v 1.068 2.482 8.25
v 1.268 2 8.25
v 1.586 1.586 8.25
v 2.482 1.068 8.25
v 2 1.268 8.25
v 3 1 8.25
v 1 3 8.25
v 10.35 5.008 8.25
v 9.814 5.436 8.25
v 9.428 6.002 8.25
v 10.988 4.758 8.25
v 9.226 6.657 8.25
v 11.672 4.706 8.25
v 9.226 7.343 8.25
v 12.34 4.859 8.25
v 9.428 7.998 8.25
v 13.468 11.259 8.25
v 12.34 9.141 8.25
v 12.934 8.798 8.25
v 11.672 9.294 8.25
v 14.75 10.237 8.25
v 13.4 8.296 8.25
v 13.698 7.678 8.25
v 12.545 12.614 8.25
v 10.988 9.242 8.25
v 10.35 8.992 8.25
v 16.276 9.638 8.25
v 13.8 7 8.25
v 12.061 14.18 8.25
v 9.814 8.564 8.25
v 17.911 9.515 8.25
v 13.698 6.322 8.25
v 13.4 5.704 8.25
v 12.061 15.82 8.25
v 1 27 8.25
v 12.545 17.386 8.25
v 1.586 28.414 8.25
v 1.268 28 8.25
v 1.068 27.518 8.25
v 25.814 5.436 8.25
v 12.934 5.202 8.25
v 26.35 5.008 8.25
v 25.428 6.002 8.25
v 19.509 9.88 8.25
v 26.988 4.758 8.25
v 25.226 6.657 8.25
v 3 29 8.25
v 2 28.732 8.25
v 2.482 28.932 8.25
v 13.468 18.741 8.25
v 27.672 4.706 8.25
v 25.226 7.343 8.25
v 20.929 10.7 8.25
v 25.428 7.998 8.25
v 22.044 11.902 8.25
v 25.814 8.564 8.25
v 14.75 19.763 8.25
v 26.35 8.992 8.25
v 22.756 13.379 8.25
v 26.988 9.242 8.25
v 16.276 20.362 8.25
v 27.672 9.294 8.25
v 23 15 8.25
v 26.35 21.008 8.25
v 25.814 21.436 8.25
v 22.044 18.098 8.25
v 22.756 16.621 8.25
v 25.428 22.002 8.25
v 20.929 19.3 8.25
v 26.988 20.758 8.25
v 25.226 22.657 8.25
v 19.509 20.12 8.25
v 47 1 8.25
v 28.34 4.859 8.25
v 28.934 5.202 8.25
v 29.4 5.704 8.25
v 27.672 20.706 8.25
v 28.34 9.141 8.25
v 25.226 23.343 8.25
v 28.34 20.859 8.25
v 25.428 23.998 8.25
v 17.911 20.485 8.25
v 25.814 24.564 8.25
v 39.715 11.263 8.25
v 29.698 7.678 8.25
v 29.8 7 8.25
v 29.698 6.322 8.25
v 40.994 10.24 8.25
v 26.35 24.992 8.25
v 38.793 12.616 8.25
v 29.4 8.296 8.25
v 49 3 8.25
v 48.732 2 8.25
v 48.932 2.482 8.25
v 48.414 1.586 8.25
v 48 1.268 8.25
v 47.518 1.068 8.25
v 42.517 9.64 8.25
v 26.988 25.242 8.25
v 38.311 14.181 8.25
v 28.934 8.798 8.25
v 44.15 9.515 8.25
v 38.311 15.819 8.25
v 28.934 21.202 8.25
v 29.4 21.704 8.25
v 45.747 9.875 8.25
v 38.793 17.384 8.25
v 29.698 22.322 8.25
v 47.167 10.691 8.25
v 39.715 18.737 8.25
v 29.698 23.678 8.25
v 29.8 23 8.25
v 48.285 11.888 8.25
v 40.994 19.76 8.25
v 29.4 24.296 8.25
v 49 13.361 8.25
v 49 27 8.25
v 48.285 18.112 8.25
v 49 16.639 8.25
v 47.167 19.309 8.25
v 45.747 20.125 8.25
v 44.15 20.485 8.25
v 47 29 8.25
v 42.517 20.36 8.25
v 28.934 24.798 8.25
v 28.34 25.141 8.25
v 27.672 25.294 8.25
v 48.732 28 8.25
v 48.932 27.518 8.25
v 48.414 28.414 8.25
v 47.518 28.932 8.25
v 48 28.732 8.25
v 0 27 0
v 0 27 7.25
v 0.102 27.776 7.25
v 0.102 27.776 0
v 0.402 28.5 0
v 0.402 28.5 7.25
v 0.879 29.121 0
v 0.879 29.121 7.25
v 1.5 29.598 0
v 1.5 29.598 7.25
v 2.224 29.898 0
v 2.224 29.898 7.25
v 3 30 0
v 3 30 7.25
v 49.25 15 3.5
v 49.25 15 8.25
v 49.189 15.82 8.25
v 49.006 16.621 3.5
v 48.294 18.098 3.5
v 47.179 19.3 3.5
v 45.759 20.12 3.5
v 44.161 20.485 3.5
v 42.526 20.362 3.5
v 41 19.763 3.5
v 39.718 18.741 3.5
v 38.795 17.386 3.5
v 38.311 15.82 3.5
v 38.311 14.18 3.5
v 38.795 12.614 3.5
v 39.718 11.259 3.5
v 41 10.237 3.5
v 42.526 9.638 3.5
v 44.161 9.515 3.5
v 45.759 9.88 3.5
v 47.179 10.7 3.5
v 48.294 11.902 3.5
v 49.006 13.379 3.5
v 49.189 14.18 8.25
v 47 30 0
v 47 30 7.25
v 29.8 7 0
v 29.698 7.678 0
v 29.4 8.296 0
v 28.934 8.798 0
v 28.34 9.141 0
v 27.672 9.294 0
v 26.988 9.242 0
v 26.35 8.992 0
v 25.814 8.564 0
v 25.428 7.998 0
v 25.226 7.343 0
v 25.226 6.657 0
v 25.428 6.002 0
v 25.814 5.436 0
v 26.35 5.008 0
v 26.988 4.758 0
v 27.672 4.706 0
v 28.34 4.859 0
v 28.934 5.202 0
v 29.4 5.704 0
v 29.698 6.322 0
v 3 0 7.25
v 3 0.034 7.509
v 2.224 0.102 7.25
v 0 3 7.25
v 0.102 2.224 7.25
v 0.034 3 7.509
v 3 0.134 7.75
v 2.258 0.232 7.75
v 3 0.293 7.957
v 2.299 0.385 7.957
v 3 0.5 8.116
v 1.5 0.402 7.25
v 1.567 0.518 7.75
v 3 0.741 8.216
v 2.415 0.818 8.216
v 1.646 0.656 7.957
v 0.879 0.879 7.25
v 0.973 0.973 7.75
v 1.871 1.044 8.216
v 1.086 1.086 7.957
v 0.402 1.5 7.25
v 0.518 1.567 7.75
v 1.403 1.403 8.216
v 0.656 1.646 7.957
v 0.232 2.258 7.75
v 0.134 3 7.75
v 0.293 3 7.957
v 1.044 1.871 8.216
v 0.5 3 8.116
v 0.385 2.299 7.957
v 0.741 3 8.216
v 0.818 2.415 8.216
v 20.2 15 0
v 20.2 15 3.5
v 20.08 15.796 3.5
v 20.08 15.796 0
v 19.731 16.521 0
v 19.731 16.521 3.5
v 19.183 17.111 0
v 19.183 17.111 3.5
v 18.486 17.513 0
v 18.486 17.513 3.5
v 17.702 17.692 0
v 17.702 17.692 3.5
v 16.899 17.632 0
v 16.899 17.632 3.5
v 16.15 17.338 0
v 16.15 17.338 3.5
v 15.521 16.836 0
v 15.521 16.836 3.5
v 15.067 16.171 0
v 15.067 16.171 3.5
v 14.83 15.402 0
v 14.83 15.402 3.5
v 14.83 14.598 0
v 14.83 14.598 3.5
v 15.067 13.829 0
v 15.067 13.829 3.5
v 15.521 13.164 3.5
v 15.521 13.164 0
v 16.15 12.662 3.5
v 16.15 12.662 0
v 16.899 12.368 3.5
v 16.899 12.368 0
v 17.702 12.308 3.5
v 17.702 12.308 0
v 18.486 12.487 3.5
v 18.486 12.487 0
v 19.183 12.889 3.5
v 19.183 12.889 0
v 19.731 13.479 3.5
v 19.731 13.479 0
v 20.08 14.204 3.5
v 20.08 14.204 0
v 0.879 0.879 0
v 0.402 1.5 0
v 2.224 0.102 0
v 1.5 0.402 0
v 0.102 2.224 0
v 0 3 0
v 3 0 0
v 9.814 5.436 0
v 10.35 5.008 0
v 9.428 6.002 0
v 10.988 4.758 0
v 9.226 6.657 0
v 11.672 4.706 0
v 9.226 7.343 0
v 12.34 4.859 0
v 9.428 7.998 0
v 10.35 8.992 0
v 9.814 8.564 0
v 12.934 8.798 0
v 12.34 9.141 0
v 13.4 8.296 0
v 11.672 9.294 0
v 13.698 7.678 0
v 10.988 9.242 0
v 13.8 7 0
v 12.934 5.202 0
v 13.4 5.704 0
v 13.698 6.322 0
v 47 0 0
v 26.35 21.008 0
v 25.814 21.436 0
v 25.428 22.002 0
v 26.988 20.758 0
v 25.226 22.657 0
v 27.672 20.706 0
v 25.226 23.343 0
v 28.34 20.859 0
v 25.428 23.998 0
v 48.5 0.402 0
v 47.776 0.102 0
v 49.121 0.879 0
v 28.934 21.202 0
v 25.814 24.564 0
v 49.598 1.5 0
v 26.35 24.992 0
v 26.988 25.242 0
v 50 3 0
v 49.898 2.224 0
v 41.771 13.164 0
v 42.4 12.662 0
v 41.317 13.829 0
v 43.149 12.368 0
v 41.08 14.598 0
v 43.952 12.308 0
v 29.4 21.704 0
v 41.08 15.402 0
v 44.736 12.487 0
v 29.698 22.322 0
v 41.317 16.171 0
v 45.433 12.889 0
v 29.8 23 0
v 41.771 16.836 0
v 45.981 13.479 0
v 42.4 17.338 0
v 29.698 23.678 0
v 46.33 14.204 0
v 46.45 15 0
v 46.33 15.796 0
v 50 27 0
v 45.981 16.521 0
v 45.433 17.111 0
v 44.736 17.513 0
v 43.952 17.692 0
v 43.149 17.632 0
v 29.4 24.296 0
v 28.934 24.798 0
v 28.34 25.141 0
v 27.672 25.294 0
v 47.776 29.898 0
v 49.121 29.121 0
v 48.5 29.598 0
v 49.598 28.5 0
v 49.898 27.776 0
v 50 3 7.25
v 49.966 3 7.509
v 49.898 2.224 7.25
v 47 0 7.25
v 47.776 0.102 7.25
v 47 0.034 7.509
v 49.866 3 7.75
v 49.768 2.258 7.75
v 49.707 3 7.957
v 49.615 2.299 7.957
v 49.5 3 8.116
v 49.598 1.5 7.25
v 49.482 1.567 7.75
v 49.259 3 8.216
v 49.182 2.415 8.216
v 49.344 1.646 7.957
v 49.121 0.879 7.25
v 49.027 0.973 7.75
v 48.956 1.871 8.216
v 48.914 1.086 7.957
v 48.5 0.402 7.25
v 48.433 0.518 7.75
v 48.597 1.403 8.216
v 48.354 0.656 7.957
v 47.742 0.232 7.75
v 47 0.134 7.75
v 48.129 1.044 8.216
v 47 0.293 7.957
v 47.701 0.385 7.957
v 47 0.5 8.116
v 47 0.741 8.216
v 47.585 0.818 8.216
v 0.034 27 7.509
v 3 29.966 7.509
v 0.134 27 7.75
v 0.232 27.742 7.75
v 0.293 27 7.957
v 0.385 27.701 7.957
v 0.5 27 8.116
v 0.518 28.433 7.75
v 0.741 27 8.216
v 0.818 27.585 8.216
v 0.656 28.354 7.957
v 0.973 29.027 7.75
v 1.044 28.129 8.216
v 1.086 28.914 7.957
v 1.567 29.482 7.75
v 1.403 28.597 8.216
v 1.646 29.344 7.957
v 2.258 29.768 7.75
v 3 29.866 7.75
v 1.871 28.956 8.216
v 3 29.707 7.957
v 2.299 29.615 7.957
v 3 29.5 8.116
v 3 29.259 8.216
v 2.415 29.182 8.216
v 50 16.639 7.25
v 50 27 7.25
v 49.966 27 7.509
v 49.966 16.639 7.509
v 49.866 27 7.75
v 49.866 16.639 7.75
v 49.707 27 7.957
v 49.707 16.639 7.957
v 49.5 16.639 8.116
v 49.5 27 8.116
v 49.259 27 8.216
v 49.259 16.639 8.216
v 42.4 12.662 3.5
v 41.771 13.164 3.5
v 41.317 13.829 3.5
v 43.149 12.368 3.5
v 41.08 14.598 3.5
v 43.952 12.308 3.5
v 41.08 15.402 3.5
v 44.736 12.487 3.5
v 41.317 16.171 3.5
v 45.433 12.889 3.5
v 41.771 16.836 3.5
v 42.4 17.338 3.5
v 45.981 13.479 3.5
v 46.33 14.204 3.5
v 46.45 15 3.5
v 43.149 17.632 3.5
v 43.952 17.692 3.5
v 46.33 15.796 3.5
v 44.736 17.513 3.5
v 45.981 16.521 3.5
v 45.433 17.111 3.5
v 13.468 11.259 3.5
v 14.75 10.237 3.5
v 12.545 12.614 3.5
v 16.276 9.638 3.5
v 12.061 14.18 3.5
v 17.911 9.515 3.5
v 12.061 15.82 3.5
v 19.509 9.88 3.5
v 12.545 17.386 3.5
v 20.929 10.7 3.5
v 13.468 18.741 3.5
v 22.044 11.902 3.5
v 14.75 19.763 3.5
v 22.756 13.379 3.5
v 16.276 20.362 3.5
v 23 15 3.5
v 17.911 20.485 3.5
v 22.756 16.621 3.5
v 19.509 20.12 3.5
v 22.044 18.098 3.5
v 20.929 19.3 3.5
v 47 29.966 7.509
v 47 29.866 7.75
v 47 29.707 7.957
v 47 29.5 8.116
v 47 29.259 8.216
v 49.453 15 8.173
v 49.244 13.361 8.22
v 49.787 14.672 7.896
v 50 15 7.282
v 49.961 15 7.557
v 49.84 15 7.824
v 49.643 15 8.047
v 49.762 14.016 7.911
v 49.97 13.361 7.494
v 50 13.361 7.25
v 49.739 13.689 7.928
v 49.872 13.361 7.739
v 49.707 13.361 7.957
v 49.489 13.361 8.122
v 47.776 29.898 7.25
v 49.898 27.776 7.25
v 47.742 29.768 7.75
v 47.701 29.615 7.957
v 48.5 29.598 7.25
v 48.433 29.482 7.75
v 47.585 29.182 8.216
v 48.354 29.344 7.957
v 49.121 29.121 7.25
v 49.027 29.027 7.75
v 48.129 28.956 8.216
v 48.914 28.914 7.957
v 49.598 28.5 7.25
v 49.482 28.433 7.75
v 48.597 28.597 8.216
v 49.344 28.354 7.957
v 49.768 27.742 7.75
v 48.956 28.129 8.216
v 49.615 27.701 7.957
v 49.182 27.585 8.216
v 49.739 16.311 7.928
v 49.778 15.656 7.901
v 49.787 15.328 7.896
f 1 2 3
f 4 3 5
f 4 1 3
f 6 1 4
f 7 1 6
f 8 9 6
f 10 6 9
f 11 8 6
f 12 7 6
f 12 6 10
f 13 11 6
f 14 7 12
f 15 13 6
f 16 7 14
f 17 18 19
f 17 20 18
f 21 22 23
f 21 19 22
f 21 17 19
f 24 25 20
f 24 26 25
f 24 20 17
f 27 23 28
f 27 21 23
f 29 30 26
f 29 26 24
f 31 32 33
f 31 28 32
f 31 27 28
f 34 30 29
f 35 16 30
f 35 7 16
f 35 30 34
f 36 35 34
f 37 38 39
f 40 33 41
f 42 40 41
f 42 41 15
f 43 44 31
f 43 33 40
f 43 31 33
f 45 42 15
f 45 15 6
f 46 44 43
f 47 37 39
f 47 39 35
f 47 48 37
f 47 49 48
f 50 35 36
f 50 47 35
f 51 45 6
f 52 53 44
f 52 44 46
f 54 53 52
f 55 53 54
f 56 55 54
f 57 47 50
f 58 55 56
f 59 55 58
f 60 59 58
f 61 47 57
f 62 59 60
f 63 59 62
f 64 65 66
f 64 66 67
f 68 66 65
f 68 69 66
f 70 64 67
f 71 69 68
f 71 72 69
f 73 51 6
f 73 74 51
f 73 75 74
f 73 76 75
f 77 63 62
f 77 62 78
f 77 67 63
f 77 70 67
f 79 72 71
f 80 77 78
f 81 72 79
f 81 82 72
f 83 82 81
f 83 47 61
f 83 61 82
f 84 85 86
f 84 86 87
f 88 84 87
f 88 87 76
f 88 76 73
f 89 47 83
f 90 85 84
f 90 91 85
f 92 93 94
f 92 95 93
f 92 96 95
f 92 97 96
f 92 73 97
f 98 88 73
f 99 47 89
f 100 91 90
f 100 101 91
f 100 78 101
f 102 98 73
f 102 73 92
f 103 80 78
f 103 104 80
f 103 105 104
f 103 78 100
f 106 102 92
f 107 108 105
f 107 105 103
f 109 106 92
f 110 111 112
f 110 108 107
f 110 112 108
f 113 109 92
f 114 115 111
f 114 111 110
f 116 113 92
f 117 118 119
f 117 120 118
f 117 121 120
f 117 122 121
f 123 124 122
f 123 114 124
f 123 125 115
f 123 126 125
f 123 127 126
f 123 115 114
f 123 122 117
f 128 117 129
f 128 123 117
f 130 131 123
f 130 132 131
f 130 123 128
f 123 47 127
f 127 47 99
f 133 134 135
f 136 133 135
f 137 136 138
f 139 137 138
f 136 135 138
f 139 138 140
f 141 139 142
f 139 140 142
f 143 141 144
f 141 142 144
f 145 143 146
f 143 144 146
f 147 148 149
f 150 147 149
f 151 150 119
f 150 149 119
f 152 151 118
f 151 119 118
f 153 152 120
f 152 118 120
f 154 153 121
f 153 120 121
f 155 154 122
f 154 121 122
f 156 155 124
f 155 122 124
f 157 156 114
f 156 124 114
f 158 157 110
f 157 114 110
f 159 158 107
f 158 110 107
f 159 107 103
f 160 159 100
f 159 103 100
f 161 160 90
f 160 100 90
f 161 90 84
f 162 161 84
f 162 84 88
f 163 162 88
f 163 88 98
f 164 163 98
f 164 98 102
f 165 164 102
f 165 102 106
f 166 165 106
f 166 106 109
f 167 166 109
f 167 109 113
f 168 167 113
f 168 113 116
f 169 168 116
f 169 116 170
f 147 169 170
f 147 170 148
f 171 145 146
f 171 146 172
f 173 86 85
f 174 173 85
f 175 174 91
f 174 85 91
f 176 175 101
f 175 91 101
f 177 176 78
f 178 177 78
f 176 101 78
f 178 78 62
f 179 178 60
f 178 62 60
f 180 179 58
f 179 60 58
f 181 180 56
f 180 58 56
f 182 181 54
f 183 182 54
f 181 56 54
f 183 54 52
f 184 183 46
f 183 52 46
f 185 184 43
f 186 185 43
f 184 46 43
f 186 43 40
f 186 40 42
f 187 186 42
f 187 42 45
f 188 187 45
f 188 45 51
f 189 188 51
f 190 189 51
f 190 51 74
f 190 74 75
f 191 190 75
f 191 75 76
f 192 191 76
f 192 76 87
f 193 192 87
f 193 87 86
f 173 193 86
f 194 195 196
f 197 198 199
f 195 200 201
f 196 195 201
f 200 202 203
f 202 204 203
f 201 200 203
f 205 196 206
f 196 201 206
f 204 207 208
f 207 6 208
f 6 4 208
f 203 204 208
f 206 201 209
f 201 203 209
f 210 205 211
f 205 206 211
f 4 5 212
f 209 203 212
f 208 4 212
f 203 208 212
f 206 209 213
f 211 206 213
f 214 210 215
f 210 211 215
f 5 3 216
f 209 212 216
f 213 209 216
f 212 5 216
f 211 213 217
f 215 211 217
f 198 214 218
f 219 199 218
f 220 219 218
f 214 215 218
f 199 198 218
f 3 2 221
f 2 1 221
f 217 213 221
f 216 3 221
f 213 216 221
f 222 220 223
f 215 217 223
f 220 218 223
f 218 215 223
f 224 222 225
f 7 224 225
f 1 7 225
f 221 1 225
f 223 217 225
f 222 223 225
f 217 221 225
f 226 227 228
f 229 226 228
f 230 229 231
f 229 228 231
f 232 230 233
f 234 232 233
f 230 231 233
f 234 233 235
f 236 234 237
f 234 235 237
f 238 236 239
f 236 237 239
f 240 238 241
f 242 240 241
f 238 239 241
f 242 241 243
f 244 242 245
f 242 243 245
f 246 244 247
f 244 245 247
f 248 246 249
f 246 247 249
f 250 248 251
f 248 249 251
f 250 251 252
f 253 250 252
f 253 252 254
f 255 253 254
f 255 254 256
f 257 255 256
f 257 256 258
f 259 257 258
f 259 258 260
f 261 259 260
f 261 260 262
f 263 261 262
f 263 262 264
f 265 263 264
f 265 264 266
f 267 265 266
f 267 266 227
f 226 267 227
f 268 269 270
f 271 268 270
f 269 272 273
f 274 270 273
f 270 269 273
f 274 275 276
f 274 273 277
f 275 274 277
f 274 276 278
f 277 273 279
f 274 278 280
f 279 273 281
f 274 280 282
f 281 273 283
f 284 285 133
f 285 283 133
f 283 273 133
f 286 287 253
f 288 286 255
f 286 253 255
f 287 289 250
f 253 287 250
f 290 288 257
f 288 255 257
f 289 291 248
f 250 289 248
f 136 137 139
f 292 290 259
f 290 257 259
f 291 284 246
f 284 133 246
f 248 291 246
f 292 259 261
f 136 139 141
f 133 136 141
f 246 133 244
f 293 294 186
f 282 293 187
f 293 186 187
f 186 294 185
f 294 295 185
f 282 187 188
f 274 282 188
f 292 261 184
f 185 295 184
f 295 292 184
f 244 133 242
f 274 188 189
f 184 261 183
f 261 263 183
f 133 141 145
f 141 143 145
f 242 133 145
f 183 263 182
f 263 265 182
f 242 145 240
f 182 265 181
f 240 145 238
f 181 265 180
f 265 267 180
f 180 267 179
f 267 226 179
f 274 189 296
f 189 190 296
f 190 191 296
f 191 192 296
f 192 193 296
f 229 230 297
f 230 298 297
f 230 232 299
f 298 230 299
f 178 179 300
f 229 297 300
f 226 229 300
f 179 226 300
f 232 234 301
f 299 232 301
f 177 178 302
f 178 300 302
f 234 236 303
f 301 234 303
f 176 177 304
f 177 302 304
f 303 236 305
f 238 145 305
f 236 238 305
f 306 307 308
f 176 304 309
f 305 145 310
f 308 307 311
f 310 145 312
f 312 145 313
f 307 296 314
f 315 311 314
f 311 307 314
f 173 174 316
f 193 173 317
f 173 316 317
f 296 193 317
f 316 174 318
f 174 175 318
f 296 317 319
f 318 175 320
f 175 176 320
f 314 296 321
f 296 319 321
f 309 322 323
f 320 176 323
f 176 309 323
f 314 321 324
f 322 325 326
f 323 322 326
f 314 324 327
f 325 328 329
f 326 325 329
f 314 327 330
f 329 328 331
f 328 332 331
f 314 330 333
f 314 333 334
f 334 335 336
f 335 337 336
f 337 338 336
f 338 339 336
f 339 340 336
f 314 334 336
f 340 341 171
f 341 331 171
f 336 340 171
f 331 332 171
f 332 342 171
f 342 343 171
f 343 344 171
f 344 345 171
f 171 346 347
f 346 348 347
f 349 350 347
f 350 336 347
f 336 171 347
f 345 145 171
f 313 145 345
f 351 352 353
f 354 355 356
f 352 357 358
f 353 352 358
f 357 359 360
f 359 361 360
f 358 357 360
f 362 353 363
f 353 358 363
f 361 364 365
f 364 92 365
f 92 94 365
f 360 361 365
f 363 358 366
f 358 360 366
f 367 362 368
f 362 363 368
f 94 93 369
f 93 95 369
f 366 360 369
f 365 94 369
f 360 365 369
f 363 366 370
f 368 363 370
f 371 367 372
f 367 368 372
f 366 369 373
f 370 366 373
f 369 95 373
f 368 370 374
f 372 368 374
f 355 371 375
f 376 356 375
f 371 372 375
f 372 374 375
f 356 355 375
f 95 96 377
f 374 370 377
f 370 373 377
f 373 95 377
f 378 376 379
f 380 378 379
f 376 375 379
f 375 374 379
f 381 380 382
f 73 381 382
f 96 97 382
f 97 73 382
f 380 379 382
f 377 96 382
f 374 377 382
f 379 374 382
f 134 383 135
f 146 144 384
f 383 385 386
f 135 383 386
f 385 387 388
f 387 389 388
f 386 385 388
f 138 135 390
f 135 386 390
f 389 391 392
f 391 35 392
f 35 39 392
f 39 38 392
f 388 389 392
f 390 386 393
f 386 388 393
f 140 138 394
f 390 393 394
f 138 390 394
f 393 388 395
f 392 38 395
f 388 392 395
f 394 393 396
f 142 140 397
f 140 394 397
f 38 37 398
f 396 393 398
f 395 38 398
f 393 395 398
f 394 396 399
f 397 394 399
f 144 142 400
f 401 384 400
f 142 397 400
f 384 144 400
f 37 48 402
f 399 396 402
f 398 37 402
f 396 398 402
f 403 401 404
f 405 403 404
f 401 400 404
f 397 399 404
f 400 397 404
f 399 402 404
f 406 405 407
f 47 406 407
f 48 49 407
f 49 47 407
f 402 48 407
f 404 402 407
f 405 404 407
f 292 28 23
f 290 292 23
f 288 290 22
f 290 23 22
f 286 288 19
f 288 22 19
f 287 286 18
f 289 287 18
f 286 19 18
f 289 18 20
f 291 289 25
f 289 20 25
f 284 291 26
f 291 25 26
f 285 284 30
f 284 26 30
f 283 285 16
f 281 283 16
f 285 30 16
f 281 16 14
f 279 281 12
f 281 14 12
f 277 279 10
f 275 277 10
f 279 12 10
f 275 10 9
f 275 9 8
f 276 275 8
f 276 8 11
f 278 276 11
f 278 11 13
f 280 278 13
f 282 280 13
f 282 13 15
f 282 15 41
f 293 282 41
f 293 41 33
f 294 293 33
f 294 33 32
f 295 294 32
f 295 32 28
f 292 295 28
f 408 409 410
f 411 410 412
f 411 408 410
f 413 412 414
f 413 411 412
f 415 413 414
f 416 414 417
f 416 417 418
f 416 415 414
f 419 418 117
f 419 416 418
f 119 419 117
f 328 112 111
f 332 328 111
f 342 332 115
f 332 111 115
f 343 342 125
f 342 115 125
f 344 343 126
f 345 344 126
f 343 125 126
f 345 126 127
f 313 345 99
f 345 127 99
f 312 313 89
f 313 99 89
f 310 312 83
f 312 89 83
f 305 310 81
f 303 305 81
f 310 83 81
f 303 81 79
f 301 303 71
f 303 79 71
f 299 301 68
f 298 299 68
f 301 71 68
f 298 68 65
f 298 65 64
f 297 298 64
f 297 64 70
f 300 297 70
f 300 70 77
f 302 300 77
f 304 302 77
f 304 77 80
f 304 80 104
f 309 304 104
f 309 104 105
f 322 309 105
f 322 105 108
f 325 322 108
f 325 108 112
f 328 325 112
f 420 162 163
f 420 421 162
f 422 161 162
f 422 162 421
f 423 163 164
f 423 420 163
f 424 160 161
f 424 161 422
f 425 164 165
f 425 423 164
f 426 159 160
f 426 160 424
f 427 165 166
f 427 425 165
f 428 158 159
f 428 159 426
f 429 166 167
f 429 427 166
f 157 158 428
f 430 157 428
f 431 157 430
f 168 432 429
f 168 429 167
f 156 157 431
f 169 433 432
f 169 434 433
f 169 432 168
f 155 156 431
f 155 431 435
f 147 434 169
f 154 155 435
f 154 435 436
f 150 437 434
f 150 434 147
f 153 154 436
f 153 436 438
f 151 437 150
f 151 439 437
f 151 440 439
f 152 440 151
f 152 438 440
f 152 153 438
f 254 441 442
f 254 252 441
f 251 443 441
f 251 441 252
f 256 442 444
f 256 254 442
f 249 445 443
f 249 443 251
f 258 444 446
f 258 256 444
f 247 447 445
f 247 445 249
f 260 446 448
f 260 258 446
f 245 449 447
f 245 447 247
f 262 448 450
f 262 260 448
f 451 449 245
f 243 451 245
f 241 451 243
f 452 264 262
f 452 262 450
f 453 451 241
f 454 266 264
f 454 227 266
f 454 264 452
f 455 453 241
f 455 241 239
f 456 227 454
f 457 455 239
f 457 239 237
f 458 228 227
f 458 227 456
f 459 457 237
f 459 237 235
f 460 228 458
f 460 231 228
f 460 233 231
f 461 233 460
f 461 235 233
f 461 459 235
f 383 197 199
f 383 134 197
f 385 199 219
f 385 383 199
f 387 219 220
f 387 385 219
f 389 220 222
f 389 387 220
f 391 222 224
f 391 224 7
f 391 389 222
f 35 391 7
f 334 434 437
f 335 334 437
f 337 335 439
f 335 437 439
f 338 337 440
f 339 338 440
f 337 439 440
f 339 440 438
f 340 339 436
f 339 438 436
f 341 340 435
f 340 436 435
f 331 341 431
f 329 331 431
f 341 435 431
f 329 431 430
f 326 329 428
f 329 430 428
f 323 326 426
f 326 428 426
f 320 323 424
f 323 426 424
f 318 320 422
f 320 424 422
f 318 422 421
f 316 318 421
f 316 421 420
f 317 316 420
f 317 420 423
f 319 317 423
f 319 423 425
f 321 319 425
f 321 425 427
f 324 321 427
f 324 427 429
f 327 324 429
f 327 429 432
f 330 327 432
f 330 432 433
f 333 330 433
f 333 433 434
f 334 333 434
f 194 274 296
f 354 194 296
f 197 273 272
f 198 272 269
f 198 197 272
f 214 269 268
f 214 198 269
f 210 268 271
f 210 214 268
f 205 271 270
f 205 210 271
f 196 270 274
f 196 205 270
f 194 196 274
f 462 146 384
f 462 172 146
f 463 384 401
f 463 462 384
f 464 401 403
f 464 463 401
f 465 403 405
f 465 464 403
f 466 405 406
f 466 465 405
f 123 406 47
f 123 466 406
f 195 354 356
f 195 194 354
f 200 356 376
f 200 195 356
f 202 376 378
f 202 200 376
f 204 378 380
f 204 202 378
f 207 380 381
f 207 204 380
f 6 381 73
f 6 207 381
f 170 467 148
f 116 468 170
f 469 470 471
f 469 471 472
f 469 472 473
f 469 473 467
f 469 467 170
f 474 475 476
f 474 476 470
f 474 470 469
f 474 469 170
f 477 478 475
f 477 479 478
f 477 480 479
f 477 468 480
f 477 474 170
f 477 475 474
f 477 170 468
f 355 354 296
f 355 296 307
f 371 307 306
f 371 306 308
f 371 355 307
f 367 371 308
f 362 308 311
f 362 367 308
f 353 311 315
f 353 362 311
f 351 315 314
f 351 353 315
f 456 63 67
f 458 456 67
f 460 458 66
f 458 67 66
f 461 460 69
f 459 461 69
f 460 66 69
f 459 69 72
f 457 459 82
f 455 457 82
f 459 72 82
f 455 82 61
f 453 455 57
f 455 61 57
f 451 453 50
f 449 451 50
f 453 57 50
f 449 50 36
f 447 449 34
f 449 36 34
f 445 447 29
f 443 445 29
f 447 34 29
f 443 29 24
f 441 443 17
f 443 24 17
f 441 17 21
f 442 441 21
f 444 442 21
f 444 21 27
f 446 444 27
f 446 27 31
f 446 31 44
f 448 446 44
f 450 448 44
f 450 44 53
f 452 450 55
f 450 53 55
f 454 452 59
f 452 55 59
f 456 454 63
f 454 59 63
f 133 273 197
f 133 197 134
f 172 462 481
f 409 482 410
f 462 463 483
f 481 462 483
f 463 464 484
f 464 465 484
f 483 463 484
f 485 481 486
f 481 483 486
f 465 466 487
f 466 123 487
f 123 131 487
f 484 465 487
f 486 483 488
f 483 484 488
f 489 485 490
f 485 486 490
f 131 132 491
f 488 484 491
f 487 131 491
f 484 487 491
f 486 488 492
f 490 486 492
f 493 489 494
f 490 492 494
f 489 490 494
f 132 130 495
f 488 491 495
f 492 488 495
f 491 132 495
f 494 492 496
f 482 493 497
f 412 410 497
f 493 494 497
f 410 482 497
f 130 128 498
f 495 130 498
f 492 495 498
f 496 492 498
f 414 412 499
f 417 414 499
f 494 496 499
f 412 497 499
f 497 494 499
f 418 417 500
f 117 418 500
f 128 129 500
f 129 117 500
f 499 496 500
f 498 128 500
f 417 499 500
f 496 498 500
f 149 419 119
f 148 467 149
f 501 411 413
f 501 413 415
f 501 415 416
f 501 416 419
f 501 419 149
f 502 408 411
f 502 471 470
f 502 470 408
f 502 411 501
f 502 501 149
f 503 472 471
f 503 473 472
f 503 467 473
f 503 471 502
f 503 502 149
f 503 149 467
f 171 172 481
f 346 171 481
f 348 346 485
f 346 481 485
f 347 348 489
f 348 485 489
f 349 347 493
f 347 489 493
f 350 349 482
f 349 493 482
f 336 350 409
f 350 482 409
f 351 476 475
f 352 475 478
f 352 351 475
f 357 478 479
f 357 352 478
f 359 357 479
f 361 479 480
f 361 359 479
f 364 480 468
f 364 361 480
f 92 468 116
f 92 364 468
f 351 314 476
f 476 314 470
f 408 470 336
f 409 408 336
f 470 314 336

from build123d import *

# Parameters (mm, degrees)
SKETCH_W        = 50
SKETCH_H        = 30
PAD_DEPTH       = 8.25
SKETCH001_R     = 2.3
POCKET_DEPTH    = 8.251
SKETCH002_R     = 2.7
POCKET001_DEPTH = 8.251
SKETCH003_R     = 5.5
POCKET002_DEPTH = 4.75
FILLET_R        = 3
FILLET001_R     = 1


with BuildPart() as part:
    # Sketch → Pad (new body)
    with BuildSketch(Plane.XY):
        with Locations((25, 15)):
            Rectangle(SKETCH_W, SKETCH_H)
    extrude(amount=PAD_DEPTH)

    # Sketch001 (on Face6 of Pad) → Pocket (cut, through all)
    with BuildSketch(Plane.XY.offset(8.25)):
        with Locations((27.5, 23)):
            Circle(SKETCH001_R)
        with Locations((27.5, 7)):
            Circle(SKETCH001_R)
        with Locations((11.5, 7)):
            Circle(SKETCH001_R)
    extrude(amount=-POCKET_DEPTH, mode=Mode.SUBTRACT)

    # Sketch002 (on Face5 of Pocket) → Pocket001 (cut, through all)
    with BuildSketch(Plane.XY.offset(8.25)):
        with Locations((17.5, 15)):
            Circle(SKETCH002_R)
        with Locations((43.75, 15)):
            Circle(SKETCH002_R)
    extrude(amount=-POCKET001_DEPTH, mode=Mode.SUBTRACT)

    # Sketch003 (on Face5 of Pocket001) → Pocket002 (cut)
    with BuildSketch(Plane.XY.offset(8.25)):
        with Locations((43.75, 15)):
            Circle(SKETCH003_R)
        with Locations((17.5, 15)):
            Circle(SKETCH003_R)
    extrude(amount=-POCKET002_DEPTH, mode=Mode.SUBTRACT)

    # Fillet
    fillet_edges = [part.edges().sort_by_distance(p)[0] for p in [
        (50, 0, 4.125),
        (50, 30, 4.125),
        (0, 30, 4.125),
        (0, 0, 4.125),
    ]]
    fillet(fillet_edges, radius=FILLET_R)

    # Fillet001
    fillet001_edges = [part.edges().sort_by_distance(p)[0] for p in [
        (0, 15, 8.25),
        (0.87868, 29.12132, 8.25),
        (25, 30, 8.25),
        (49.12132, 29.12132, 8.25),
        (50, 15, 8.25),
        (49.12132, 0.87868, 8.25),
        (25, 0, 8.25),
        (0.87868, 0.87868, 8.25),
    ]]
    fillet(fillet001_edges, radius=FILLET001_R)


solid = part.part
